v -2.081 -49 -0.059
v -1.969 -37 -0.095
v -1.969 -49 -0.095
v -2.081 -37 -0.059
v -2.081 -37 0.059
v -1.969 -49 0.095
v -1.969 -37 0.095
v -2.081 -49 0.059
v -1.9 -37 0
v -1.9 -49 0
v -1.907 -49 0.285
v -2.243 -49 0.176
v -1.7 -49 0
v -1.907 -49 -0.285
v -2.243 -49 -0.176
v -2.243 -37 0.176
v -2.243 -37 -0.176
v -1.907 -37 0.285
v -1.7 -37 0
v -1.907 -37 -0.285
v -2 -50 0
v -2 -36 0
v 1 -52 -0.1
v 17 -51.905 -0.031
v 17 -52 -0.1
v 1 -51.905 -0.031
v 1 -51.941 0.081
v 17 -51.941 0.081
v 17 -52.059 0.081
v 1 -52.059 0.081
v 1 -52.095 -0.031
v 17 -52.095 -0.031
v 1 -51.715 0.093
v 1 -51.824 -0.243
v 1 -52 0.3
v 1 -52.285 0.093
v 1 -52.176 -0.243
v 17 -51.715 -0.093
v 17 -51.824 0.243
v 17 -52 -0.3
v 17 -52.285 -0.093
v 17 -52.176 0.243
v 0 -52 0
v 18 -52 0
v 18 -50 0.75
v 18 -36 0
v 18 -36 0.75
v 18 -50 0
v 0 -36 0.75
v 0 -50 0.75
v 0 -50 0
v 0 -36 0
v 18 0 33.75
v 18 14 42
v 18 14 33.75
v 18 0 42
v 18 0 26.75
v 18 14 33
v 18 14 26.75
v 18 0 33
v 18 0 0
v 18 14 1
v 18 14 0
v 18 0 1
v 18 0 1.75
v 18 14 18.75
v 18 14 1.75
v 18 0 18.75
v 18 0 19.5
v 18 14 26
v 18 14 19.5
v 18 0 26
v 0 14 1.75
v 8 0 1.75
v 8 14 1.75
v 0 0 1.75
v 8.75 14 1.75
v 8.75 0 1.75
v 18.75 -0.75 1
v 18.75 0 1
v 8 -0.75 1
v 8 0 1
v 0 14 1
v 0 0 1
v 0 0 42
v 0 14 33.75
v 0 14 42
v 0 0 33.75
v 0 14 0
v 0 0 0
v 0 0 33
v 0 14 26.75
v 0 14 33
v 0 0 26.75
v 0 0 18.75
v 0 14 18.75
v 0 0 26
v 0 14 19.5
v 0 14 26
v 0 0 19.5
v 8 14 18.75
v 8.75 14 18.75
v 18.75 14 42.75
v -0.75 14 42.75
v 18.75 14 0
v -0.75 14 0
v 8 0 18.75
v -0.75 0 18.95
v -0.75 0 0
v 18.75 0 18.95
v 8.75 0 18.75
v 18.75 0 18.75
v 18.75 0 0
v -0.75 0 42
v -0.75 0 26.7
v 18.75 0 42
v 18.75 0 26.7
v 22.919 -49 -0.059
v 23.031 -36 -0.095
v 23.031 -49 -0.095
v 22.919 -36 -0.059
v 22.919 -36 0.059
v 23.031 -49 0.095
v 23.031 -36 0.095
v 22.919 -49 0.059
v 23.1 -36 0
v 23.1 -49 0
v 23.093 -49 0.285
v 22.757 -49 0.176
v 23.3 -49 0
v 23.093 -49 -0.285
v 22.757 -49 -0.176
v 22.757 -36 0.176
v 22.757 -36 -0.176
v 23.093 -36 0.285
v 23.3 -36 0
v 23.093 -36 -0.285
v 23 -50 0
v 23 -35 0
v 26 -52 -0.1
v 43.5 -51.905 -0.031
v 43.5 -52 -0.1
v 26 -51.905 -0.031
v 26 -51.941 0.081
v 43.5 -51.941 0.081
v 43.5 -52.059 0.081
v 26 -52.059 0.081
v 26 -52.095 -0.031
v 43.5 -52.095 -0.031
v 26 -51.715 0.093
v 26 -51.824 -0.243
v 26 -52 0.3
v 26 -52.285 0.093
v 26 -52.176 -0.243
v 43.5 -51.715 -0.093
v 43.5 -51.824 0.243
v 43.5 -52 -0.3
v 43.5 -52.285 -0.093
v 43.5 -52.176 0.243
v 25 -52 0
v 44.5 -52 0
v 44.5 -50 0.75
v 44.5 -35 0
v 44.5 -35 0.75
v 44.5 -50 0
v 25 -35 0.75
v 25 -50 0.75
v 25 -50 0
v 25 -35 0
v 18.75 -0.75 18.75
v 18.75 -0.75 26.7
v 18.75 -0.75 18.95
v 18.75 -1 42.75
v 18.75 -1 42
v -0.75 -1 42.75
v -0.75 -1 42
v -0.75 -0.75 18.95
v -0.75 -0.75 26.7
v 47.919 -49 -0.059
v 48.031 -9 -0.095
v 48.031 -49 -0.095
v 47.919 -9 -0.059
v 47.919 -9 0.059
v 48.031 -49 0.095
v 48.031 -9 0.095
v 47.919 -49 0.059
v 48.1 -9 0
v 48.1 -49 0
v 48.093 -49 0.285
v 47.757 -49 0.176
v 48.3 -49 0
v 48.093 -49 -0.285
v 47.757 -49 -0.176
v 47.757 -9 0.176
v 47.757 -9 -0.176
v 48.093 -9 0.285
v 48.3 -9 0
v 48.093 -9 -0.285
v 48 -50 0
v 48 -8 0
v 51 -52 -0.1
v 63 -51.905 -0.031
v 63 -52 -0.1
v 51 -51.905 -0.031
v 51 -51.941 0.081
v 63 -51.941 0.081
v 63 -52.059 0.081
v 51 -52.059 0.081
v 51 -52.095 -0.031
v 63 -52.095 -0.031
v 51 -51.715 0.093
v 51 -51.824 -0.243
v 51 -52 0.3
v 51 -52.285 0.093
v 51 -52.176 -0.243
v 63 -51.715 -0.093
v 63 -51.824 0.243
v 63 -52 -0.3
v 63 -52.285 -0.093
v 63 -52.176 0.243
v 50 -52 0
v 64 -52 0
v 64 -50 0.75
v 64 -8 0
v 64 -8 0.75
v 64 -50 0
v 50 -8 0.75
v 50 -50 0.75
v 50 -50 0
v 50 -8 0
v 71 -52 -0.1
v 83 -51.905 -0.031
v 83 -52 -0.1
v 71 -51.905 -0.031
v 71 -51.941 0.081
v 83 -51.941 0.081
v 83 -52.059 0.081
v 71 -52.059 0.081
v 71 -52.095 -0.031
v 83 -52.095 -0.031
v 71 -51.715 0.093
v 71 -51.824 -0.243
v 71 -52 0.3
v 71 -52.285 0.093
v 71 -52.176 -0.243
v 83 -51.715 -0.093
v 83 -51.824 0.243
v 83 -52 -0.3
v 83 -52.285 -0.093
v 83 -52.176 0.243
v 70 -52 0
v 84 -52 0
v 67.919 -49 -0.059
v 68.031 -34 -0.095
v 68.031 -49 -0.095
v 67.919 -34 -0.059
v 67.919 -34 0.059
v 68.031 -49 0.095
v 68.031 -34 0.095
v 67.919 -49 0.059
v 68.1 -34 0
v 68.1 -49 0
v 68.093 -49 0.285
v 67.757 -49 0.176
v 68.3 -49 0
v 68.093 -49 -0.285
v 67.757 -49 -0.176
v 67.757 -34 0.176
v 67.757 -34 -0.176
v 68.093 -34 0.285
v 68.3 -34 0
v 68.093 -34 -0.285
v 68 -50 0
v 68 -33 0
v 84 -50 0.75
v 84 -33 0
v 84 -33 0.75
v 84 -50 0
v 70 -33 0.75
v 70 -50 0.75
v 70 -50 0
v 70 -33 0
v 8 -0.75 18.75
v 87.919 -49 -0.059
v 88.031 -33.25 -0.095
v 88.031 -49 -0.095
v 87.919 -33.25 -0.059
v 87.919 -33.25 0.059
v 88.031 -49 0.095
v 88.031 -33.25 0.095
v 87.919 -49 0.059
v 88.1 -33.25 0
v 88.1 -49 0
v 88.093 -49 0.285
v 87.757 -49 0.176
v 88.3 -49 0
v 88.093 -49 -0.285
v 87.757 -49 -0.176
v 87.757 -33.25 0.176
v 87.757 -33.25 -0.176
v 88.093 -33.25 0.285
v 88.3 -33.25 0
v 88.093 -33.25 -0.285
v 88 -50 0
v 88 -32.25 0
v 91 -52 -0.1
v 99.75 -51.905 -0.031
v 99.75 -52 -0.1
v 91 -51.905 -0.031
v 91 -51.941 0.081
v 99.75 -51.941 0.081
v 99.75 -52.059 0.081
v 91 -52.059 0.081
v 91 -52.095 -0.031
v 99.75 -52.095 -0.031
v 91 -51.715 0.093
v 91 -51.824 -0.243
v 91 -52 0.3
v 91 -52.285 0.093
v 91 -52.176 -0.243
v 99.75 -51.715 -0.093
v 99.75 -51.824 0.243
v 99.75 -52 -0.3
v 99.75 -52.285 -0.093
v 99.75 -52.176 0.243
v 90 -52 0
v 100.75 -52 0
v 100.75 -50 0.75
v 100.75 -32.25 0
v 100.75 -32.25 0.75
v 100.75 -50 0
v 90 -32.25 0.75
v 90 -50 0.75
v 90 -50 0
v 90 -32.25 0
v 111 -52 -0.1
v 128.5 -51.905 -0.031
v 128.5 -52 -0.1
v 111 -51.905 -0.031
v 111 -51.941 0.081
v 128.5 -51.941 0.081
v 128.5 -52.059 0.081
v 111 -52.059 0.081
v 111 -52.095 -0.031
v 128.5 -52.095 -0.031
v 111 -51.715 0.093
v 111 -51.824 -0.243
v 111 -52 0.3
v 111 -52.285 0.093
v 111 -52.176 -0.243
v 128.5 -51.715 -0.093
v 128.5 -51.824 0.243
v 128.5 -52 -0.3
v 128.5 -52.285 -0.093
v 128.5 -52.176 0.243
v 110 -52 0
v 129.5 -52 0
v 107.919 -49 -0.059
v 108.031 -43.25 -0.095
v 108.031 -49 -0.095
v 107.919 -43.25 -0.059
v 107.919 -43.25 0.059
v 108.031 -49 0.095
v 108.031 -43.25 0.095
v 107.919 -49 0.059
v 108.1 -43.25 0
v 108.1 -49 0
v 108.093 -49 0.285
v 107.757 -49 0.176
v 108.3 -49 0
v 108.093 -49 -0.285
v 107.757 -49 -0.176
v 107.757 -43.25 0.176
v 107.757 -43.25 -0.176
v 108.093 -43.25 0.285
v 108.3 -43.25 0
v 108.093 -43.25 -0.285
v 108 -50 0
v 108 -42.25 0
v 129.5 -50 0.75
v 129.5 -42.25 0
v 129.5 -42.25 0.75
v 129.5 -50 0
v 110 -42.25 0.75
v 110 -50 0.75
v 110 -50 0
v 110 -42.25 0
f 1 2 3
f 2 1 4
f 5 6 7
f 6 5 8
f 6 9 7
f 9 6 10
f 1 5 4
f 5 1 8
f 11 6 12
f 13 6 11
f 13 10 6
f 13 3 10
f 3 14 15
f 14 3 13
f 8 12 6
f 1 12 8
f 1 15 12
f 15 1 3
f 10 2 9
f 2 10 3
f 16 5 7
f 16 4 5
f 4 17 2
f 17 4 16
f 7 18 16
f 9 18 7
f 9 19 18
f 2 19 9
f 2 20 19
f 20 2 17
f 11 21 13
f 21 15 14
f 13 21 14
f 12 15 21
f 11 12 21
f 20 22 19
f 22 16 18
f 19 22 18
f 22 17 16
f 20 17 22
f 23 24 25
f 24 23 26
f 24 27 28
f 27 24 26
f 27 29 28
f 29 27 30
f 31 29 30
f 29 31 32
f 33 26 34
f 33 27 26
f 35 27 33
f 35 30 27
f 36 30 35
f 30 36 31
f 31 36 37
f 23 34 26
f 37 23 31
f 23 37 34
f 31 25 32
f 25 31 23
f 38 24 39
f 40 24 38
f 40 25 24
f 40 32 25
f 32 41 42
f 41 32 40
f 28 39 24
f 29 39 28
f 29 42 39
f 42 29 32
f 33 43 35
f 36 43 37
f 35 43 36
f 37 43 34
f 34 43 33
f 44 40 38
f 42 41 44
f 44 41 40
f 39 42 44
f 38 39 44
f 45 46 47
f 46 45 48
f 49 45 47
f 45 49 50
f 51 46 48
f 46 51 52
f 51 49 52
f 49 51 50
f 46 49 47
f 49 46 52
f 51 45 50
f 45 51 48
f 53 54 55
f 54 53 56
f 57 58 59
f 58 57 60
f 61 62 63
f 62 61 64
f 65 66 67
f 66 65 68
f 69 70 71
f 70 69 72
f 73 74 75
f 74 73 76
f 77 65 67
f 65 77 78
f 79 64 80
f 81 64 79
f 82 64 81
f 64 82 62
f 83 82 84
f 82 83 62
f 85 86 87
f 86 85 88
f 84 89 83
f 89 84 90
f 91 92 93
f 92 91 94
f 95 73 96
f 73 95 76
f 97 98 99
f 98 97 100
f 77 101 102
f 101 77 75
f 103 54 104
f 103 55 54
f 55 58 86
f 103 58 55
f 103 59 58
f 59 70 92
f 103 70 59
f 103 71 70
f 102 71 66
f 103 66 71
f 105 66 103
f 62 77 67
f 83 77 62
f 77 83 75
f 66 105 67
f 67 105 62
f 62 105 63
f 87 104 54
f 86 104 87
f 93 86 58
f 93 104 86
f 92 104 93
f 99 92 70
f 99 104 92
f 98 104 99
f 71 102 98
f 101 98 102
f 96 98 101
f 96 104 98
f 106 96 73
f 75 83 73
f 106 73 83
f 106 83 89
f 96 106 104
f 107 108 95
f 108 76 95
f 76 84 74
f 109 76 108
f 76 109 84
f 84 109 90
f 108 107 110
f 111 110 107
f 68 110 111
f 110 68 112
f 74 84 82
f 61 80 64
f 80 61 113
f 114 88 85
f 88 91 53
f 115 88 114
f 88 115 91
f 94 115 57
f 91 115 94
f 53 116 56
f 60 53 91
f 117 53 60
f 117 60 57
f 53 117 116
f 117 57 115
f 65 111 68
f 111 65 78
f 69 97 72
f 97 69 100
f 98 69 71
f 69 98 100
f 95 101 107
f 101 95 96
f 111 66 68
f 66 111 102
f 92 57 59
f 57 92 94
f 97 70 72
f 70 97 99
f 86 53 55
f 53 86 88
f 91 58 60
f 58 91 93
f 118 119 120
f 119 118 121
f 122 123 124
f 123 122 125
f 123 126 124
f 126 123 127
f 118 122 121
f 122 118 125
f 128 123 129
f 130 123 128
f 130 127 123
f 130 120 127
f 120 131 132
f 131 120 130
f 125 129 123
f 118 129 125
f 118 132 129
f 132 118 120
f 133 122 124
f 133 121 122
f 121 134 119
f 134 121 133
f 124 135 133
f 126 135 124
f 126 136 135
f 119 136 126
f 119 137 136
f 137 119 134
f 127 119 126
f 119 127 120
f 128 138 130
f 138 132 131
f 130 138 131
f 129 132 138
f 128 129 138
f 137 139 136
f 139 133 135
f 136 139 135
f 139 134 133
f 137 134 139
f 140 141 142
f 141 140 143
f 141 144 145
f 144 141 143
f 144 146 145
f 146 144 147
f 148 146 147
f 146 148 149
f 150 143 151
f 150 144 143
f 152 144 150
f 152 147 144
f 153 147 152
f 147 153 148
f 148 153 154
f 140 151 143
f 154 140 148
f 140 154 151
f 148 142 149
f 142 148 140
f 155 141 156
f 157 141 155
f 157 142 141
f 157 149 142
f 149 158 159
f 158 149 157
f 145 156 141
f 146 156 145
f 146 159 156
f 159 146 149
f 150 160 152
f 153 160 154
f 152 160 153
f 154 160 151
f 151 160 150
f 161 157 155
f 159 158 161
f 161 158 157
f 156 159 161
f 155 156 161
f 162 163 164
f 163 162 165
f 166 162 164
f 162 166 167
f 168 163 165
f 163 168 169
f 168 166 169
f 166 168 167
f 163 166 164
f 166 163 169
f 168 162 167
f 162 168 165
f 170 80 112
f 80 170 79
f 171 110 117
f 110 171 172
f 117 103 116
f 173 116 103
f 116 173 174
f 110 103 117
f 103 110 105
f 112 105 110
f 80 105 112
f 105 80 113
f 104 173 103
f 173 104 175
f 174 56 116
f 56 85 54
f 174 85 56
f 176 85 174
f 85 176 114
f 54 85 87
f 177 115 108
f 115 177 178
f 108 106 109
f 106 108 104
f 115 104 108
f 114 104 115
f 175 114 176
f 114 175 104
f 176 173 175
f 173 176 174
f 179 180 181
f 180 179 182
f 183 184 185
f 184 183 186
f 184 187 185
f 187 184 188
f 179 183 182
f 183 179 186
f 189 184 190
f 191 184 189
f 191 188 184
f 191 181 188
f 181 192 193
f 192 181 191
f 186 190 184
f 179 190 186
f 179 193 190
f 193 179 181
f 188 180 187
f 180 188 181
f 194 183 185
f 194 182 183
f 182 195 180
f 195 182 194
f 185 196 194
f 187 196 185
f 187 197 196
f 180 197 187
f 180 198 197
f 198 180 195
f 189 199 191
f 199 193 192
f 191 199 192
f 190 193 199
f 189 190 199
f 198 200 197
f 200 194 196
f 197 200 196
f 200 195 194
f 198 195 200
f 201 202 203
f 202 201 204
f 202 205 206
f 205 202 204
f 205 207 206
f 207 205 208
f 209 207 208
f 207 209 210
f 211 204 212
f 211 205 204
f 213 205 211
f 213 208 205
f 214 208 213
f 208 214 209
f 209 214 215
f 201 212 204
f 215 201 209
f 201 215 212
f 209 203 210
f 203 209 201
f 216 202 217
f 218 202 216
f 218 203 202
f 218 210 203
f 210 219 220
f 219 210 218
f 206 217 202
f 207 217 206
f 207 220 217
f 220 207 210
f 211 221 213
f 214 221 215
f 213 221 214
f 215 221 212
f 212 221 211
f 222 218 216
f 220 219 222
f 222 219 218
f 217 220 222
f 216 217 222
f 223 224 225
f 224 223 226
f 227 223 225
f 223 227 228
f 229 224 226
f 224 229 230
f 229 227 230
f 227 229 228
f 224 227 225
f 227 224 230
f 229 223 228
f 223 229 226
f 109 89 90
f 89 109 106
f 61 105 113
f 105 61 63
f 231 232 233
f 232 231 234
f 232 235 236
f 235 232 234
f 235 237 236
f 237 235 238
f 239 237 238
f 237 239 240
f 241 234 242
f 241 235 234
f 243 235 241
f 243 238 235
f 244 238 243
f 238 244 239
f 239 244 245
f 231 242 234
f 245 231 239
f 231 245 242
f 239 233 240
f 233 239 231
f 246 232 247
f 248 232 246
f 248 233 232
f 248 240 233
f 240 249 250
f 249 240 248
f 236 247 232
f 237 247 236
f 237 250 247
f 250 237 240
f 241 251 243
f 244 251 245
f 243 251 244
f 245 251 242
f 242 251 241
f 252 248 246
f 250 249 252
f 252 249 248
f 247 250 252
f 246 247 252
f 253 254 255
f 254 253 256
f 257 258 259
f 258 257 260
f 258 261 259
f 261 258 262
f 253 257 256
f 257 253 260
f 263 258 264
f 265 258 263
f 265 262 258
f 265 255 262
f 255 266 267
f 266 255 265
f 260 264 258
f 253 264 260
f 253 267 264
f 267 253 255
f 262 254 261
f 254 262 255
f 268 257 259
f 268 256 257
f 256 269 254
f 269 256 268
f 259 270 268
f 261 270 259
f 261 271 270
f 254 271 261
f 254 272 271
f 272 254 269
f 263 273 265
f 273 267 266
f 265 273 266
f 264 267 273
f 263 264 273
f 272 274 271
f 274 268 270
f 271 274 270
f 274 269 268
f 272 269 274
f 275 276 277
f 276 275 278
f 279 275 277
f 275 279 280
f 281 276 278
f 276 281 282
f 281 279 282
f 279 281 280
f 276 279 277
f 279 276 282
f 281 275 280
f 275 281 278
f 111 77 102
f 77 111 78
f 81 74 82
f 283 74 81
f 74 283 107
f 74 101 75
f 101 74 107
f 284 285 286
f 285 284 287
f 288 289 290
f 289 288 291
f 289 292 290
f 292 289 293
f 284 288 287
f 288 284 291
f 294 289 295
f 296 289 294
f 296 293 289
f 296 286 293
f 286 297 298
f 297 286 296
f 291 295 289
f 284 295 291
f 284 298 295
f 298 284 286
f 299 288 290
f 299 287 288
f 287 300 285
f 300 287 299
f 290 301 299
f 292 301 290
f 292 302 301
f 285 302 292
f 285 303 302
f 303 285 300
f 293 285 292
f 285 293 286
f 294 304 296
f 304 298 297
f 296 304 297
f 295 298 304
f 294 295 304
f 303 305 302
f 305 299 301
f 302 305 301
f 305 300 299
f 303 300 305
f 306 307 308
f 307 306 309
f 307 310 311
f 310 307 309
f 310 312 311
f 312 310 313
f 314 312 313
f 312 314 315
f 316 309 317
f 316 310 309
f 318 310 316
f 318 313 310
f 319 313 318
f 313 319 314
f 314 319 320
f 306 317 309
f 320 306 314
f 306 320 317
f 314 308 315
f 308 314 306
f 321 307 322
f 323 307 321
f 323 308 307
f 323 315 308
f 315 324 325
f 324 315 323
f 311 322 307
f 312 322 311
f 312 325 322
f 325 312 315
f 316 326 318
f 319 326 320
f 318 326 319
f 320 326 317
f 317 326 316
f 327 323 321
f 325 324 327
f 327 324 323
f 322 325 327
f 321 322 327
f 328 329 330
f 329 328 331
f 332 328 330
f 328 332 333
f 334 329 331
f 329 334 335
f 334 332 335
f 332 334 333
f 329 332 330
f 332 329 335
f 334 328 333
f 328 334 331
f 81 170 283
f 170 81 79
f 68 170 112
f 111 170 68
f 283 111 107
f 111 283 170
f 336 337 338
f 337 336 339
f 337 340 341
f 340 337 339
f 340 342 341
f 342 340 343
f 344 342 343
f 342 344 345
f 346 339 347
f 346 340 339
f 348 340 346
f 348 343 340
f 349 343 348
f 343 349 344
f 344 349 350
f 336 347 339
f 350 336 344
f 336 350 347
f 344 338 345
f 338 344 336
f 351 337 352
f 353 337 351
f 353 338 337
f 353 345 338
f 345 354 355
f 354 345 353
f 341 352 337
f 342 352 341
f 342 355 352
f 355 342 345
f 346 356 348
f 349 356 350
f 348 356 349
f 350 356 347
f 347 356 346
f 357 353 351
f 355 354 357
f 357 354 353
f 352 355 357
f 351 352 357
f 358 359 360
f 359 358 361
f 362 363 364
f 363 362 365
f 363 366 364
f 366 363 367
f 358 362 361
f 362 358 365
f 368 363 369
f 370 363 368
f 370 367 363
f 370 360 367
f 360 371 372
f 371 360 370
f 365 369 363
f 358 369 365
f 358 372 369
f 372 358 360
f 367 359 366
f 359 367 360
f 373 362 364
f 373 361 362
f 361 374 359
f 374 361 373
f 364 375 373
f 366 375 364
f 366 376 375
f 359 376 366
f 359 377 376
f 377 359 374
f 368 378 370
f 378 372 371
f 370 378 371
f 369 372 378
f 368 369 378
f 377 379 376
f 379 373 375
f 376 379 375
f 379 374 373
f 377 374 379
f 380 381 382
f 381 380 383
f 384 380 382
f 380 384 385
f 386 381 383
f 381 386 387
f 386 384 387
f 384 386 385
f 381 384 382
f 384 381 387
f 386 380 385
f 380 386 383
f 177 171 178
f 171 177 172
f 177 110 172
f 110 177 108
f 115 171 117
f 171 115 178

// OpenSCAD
Thick = 0.75;

//--------------------------------------------------------------------------------------------------
// Common moudles
//--------------------------------------------------------------------------------------------------

// X dimensional arrow
module arrow_x(l)
{
    line_w = 0.1;
    arrow_w = 1;
    arrow_h = 0.3;

    // Line
    translate([l / 2, 0, 0])
    {
        rotate([0, 90, 0])
        {
            color([0.4, 0.4, 0.4])
            cylinder(l - arrow_w * 2, line_w, line_w, true);
        }
    }

    // Left arrow
    translate([arrow_w, 0, 0])
    {
        rotate([0, 270, 0])
        {
            color([0.4, 0.4, 0.4])
            cylinder(arrow_w, arrow_h, 0, false);
        }
    }

    // Right arrow
    translate([l - arrow_w, 0, 0])
    {
        rotate([0, 90, 0])
        {
            color([0.4, 0.4, 0.4])
            cylinder(arrow_w, arrow_h, 0, false);
        }
    }

    // Text
    translate([l/3, 0.5, 0])
    {
        color([0.4, 0.4, 0.4])
        text(str(l), size=1);
    }
}

// Y dimensional arrow
module arrow_y(l)
{
    line_w = 0.1;
    arrow_w = 1;
    arrow_h = 0.3;

    // Line
    translate([0, l / 2, 0])
    {
        rotate([90, 0, 00])
        {
            color([0.4, 0.4, 0.4])
            cylinder(l - arrow_w * 2, line_w, line_w, true);
        }
    }

    // Left arrow
    translate([0 ,arrow_w, 0])
    {
        rotate([90, 0, 0])
        {
            color([0.4, 0.4, 0.4])
            cylinder(arrow_w, arrow_h, 0, false);
        }
    }

    // Right arrow
    translate([0, l - arrow_w, 0])
    {
        rotate([270, 0, 0])
        {
            color([0.4, 0.4, 0.4])
            cylinder(arrow_w, arrow_h, 0, false);
        }
    }

    // Text
    translate([-0.5, l/3, 0])
    {
        rotate([0 ,0, 90])
        {
            color([0.4, 0.4, 0.4])
            text(str(l), size=1);
        }
    }
}

module dimension(x, y, z, r, g, b, dx, dy = 50)
{
    
    translate([dx, -dy, 0])
    {
        color([r, g, b])
        cube([x, y, z]);

        translate([-2, 0, 0])
        {
            arrow_y(y);
        }

        translate([0, -2, 0])
        {
            arrow_x(x);
        }
    }
}

DimensionY = 50;

module board(x, y, z, r, g, b, posX, posY, posZ, rotX, rotY, rotZ, dimX, dimY = DimensionY)
{
    translate([posX, posY, posZ])
    {
        rotate([rotX, rotY, rotZ])
        {
            color([r, g, b])
            cube([x, y, z]);
        }
    }

    dimension(x, y, z, r, g, b, dimX, dimY);
}

//------------------------------------------------------------------------------
// Draw parts
//------------------------------------------------------------------------------

// Bottom
board(
    18, 14, Thick,
    0.7, 0.7, 1.0,
    0, 0, 1,
    0, 0, 0,
    0, DimensionY);

board(
    18, 14, Thick,
    0.7, 0.7, 1.0,
    0, 0, 1 + Thick + 17,
    0, 0, 0,
    0, DimensionY);

board(
    18, 14, Thick,
    0.7, 0.7, 1.0,
    0, 0, 42.75 - Thick - 7 - 7 - 2,
    0, 0, 0,
    0, DimensionY);

board(
    18, 14, Thick,
    0.7, 0.7, 1.0,
    0, 0, 42.75 - Thick - 7 - 2,
    0, 0, 0,
    0, DimensionY);

// Top
board(
    18 + Thick * 2, 14 + 1, Thick,
    0.5, 0.2, 1.0,
    -Thick, -1, 42.75 - Thick,
    0, 0, 0,
    25, DimensionY);

// Side boards
board(
    14, 42.75 - Thick, Thick,
    0.7, 1.0, 1.0,
    -Thick, 0, 0,
    90, 0, 90,
    50, DimensionY);

board(
    14, 42.75 - Thick, Thick,
    0.7, 1.0, 1.0,
    -Thick + 18 + Thick, 0, 0,
    90, 0, 90,
    50, DimensionY);

board(
    14, 17, Thick,
    0.7, 1.0, 0.3,
    8, 0, 1 + Thick,
    90, 0, 90,
    70, DimensionY);

// Doors
board(
    10.75, 17 + Thick, Thick,
    0.7, 0.2, 0.3,
    8, 0, 1,
    90, 0, 0,
    90, DimensionY);

board(
    18 + Thick * 2, 7.75, Thick,
    0.7, 0.5, 0.5,
    -Thick, 0, 1 + 17 + Thick + 0.2,
    90, 0, 0,
    110, DimensionY);
